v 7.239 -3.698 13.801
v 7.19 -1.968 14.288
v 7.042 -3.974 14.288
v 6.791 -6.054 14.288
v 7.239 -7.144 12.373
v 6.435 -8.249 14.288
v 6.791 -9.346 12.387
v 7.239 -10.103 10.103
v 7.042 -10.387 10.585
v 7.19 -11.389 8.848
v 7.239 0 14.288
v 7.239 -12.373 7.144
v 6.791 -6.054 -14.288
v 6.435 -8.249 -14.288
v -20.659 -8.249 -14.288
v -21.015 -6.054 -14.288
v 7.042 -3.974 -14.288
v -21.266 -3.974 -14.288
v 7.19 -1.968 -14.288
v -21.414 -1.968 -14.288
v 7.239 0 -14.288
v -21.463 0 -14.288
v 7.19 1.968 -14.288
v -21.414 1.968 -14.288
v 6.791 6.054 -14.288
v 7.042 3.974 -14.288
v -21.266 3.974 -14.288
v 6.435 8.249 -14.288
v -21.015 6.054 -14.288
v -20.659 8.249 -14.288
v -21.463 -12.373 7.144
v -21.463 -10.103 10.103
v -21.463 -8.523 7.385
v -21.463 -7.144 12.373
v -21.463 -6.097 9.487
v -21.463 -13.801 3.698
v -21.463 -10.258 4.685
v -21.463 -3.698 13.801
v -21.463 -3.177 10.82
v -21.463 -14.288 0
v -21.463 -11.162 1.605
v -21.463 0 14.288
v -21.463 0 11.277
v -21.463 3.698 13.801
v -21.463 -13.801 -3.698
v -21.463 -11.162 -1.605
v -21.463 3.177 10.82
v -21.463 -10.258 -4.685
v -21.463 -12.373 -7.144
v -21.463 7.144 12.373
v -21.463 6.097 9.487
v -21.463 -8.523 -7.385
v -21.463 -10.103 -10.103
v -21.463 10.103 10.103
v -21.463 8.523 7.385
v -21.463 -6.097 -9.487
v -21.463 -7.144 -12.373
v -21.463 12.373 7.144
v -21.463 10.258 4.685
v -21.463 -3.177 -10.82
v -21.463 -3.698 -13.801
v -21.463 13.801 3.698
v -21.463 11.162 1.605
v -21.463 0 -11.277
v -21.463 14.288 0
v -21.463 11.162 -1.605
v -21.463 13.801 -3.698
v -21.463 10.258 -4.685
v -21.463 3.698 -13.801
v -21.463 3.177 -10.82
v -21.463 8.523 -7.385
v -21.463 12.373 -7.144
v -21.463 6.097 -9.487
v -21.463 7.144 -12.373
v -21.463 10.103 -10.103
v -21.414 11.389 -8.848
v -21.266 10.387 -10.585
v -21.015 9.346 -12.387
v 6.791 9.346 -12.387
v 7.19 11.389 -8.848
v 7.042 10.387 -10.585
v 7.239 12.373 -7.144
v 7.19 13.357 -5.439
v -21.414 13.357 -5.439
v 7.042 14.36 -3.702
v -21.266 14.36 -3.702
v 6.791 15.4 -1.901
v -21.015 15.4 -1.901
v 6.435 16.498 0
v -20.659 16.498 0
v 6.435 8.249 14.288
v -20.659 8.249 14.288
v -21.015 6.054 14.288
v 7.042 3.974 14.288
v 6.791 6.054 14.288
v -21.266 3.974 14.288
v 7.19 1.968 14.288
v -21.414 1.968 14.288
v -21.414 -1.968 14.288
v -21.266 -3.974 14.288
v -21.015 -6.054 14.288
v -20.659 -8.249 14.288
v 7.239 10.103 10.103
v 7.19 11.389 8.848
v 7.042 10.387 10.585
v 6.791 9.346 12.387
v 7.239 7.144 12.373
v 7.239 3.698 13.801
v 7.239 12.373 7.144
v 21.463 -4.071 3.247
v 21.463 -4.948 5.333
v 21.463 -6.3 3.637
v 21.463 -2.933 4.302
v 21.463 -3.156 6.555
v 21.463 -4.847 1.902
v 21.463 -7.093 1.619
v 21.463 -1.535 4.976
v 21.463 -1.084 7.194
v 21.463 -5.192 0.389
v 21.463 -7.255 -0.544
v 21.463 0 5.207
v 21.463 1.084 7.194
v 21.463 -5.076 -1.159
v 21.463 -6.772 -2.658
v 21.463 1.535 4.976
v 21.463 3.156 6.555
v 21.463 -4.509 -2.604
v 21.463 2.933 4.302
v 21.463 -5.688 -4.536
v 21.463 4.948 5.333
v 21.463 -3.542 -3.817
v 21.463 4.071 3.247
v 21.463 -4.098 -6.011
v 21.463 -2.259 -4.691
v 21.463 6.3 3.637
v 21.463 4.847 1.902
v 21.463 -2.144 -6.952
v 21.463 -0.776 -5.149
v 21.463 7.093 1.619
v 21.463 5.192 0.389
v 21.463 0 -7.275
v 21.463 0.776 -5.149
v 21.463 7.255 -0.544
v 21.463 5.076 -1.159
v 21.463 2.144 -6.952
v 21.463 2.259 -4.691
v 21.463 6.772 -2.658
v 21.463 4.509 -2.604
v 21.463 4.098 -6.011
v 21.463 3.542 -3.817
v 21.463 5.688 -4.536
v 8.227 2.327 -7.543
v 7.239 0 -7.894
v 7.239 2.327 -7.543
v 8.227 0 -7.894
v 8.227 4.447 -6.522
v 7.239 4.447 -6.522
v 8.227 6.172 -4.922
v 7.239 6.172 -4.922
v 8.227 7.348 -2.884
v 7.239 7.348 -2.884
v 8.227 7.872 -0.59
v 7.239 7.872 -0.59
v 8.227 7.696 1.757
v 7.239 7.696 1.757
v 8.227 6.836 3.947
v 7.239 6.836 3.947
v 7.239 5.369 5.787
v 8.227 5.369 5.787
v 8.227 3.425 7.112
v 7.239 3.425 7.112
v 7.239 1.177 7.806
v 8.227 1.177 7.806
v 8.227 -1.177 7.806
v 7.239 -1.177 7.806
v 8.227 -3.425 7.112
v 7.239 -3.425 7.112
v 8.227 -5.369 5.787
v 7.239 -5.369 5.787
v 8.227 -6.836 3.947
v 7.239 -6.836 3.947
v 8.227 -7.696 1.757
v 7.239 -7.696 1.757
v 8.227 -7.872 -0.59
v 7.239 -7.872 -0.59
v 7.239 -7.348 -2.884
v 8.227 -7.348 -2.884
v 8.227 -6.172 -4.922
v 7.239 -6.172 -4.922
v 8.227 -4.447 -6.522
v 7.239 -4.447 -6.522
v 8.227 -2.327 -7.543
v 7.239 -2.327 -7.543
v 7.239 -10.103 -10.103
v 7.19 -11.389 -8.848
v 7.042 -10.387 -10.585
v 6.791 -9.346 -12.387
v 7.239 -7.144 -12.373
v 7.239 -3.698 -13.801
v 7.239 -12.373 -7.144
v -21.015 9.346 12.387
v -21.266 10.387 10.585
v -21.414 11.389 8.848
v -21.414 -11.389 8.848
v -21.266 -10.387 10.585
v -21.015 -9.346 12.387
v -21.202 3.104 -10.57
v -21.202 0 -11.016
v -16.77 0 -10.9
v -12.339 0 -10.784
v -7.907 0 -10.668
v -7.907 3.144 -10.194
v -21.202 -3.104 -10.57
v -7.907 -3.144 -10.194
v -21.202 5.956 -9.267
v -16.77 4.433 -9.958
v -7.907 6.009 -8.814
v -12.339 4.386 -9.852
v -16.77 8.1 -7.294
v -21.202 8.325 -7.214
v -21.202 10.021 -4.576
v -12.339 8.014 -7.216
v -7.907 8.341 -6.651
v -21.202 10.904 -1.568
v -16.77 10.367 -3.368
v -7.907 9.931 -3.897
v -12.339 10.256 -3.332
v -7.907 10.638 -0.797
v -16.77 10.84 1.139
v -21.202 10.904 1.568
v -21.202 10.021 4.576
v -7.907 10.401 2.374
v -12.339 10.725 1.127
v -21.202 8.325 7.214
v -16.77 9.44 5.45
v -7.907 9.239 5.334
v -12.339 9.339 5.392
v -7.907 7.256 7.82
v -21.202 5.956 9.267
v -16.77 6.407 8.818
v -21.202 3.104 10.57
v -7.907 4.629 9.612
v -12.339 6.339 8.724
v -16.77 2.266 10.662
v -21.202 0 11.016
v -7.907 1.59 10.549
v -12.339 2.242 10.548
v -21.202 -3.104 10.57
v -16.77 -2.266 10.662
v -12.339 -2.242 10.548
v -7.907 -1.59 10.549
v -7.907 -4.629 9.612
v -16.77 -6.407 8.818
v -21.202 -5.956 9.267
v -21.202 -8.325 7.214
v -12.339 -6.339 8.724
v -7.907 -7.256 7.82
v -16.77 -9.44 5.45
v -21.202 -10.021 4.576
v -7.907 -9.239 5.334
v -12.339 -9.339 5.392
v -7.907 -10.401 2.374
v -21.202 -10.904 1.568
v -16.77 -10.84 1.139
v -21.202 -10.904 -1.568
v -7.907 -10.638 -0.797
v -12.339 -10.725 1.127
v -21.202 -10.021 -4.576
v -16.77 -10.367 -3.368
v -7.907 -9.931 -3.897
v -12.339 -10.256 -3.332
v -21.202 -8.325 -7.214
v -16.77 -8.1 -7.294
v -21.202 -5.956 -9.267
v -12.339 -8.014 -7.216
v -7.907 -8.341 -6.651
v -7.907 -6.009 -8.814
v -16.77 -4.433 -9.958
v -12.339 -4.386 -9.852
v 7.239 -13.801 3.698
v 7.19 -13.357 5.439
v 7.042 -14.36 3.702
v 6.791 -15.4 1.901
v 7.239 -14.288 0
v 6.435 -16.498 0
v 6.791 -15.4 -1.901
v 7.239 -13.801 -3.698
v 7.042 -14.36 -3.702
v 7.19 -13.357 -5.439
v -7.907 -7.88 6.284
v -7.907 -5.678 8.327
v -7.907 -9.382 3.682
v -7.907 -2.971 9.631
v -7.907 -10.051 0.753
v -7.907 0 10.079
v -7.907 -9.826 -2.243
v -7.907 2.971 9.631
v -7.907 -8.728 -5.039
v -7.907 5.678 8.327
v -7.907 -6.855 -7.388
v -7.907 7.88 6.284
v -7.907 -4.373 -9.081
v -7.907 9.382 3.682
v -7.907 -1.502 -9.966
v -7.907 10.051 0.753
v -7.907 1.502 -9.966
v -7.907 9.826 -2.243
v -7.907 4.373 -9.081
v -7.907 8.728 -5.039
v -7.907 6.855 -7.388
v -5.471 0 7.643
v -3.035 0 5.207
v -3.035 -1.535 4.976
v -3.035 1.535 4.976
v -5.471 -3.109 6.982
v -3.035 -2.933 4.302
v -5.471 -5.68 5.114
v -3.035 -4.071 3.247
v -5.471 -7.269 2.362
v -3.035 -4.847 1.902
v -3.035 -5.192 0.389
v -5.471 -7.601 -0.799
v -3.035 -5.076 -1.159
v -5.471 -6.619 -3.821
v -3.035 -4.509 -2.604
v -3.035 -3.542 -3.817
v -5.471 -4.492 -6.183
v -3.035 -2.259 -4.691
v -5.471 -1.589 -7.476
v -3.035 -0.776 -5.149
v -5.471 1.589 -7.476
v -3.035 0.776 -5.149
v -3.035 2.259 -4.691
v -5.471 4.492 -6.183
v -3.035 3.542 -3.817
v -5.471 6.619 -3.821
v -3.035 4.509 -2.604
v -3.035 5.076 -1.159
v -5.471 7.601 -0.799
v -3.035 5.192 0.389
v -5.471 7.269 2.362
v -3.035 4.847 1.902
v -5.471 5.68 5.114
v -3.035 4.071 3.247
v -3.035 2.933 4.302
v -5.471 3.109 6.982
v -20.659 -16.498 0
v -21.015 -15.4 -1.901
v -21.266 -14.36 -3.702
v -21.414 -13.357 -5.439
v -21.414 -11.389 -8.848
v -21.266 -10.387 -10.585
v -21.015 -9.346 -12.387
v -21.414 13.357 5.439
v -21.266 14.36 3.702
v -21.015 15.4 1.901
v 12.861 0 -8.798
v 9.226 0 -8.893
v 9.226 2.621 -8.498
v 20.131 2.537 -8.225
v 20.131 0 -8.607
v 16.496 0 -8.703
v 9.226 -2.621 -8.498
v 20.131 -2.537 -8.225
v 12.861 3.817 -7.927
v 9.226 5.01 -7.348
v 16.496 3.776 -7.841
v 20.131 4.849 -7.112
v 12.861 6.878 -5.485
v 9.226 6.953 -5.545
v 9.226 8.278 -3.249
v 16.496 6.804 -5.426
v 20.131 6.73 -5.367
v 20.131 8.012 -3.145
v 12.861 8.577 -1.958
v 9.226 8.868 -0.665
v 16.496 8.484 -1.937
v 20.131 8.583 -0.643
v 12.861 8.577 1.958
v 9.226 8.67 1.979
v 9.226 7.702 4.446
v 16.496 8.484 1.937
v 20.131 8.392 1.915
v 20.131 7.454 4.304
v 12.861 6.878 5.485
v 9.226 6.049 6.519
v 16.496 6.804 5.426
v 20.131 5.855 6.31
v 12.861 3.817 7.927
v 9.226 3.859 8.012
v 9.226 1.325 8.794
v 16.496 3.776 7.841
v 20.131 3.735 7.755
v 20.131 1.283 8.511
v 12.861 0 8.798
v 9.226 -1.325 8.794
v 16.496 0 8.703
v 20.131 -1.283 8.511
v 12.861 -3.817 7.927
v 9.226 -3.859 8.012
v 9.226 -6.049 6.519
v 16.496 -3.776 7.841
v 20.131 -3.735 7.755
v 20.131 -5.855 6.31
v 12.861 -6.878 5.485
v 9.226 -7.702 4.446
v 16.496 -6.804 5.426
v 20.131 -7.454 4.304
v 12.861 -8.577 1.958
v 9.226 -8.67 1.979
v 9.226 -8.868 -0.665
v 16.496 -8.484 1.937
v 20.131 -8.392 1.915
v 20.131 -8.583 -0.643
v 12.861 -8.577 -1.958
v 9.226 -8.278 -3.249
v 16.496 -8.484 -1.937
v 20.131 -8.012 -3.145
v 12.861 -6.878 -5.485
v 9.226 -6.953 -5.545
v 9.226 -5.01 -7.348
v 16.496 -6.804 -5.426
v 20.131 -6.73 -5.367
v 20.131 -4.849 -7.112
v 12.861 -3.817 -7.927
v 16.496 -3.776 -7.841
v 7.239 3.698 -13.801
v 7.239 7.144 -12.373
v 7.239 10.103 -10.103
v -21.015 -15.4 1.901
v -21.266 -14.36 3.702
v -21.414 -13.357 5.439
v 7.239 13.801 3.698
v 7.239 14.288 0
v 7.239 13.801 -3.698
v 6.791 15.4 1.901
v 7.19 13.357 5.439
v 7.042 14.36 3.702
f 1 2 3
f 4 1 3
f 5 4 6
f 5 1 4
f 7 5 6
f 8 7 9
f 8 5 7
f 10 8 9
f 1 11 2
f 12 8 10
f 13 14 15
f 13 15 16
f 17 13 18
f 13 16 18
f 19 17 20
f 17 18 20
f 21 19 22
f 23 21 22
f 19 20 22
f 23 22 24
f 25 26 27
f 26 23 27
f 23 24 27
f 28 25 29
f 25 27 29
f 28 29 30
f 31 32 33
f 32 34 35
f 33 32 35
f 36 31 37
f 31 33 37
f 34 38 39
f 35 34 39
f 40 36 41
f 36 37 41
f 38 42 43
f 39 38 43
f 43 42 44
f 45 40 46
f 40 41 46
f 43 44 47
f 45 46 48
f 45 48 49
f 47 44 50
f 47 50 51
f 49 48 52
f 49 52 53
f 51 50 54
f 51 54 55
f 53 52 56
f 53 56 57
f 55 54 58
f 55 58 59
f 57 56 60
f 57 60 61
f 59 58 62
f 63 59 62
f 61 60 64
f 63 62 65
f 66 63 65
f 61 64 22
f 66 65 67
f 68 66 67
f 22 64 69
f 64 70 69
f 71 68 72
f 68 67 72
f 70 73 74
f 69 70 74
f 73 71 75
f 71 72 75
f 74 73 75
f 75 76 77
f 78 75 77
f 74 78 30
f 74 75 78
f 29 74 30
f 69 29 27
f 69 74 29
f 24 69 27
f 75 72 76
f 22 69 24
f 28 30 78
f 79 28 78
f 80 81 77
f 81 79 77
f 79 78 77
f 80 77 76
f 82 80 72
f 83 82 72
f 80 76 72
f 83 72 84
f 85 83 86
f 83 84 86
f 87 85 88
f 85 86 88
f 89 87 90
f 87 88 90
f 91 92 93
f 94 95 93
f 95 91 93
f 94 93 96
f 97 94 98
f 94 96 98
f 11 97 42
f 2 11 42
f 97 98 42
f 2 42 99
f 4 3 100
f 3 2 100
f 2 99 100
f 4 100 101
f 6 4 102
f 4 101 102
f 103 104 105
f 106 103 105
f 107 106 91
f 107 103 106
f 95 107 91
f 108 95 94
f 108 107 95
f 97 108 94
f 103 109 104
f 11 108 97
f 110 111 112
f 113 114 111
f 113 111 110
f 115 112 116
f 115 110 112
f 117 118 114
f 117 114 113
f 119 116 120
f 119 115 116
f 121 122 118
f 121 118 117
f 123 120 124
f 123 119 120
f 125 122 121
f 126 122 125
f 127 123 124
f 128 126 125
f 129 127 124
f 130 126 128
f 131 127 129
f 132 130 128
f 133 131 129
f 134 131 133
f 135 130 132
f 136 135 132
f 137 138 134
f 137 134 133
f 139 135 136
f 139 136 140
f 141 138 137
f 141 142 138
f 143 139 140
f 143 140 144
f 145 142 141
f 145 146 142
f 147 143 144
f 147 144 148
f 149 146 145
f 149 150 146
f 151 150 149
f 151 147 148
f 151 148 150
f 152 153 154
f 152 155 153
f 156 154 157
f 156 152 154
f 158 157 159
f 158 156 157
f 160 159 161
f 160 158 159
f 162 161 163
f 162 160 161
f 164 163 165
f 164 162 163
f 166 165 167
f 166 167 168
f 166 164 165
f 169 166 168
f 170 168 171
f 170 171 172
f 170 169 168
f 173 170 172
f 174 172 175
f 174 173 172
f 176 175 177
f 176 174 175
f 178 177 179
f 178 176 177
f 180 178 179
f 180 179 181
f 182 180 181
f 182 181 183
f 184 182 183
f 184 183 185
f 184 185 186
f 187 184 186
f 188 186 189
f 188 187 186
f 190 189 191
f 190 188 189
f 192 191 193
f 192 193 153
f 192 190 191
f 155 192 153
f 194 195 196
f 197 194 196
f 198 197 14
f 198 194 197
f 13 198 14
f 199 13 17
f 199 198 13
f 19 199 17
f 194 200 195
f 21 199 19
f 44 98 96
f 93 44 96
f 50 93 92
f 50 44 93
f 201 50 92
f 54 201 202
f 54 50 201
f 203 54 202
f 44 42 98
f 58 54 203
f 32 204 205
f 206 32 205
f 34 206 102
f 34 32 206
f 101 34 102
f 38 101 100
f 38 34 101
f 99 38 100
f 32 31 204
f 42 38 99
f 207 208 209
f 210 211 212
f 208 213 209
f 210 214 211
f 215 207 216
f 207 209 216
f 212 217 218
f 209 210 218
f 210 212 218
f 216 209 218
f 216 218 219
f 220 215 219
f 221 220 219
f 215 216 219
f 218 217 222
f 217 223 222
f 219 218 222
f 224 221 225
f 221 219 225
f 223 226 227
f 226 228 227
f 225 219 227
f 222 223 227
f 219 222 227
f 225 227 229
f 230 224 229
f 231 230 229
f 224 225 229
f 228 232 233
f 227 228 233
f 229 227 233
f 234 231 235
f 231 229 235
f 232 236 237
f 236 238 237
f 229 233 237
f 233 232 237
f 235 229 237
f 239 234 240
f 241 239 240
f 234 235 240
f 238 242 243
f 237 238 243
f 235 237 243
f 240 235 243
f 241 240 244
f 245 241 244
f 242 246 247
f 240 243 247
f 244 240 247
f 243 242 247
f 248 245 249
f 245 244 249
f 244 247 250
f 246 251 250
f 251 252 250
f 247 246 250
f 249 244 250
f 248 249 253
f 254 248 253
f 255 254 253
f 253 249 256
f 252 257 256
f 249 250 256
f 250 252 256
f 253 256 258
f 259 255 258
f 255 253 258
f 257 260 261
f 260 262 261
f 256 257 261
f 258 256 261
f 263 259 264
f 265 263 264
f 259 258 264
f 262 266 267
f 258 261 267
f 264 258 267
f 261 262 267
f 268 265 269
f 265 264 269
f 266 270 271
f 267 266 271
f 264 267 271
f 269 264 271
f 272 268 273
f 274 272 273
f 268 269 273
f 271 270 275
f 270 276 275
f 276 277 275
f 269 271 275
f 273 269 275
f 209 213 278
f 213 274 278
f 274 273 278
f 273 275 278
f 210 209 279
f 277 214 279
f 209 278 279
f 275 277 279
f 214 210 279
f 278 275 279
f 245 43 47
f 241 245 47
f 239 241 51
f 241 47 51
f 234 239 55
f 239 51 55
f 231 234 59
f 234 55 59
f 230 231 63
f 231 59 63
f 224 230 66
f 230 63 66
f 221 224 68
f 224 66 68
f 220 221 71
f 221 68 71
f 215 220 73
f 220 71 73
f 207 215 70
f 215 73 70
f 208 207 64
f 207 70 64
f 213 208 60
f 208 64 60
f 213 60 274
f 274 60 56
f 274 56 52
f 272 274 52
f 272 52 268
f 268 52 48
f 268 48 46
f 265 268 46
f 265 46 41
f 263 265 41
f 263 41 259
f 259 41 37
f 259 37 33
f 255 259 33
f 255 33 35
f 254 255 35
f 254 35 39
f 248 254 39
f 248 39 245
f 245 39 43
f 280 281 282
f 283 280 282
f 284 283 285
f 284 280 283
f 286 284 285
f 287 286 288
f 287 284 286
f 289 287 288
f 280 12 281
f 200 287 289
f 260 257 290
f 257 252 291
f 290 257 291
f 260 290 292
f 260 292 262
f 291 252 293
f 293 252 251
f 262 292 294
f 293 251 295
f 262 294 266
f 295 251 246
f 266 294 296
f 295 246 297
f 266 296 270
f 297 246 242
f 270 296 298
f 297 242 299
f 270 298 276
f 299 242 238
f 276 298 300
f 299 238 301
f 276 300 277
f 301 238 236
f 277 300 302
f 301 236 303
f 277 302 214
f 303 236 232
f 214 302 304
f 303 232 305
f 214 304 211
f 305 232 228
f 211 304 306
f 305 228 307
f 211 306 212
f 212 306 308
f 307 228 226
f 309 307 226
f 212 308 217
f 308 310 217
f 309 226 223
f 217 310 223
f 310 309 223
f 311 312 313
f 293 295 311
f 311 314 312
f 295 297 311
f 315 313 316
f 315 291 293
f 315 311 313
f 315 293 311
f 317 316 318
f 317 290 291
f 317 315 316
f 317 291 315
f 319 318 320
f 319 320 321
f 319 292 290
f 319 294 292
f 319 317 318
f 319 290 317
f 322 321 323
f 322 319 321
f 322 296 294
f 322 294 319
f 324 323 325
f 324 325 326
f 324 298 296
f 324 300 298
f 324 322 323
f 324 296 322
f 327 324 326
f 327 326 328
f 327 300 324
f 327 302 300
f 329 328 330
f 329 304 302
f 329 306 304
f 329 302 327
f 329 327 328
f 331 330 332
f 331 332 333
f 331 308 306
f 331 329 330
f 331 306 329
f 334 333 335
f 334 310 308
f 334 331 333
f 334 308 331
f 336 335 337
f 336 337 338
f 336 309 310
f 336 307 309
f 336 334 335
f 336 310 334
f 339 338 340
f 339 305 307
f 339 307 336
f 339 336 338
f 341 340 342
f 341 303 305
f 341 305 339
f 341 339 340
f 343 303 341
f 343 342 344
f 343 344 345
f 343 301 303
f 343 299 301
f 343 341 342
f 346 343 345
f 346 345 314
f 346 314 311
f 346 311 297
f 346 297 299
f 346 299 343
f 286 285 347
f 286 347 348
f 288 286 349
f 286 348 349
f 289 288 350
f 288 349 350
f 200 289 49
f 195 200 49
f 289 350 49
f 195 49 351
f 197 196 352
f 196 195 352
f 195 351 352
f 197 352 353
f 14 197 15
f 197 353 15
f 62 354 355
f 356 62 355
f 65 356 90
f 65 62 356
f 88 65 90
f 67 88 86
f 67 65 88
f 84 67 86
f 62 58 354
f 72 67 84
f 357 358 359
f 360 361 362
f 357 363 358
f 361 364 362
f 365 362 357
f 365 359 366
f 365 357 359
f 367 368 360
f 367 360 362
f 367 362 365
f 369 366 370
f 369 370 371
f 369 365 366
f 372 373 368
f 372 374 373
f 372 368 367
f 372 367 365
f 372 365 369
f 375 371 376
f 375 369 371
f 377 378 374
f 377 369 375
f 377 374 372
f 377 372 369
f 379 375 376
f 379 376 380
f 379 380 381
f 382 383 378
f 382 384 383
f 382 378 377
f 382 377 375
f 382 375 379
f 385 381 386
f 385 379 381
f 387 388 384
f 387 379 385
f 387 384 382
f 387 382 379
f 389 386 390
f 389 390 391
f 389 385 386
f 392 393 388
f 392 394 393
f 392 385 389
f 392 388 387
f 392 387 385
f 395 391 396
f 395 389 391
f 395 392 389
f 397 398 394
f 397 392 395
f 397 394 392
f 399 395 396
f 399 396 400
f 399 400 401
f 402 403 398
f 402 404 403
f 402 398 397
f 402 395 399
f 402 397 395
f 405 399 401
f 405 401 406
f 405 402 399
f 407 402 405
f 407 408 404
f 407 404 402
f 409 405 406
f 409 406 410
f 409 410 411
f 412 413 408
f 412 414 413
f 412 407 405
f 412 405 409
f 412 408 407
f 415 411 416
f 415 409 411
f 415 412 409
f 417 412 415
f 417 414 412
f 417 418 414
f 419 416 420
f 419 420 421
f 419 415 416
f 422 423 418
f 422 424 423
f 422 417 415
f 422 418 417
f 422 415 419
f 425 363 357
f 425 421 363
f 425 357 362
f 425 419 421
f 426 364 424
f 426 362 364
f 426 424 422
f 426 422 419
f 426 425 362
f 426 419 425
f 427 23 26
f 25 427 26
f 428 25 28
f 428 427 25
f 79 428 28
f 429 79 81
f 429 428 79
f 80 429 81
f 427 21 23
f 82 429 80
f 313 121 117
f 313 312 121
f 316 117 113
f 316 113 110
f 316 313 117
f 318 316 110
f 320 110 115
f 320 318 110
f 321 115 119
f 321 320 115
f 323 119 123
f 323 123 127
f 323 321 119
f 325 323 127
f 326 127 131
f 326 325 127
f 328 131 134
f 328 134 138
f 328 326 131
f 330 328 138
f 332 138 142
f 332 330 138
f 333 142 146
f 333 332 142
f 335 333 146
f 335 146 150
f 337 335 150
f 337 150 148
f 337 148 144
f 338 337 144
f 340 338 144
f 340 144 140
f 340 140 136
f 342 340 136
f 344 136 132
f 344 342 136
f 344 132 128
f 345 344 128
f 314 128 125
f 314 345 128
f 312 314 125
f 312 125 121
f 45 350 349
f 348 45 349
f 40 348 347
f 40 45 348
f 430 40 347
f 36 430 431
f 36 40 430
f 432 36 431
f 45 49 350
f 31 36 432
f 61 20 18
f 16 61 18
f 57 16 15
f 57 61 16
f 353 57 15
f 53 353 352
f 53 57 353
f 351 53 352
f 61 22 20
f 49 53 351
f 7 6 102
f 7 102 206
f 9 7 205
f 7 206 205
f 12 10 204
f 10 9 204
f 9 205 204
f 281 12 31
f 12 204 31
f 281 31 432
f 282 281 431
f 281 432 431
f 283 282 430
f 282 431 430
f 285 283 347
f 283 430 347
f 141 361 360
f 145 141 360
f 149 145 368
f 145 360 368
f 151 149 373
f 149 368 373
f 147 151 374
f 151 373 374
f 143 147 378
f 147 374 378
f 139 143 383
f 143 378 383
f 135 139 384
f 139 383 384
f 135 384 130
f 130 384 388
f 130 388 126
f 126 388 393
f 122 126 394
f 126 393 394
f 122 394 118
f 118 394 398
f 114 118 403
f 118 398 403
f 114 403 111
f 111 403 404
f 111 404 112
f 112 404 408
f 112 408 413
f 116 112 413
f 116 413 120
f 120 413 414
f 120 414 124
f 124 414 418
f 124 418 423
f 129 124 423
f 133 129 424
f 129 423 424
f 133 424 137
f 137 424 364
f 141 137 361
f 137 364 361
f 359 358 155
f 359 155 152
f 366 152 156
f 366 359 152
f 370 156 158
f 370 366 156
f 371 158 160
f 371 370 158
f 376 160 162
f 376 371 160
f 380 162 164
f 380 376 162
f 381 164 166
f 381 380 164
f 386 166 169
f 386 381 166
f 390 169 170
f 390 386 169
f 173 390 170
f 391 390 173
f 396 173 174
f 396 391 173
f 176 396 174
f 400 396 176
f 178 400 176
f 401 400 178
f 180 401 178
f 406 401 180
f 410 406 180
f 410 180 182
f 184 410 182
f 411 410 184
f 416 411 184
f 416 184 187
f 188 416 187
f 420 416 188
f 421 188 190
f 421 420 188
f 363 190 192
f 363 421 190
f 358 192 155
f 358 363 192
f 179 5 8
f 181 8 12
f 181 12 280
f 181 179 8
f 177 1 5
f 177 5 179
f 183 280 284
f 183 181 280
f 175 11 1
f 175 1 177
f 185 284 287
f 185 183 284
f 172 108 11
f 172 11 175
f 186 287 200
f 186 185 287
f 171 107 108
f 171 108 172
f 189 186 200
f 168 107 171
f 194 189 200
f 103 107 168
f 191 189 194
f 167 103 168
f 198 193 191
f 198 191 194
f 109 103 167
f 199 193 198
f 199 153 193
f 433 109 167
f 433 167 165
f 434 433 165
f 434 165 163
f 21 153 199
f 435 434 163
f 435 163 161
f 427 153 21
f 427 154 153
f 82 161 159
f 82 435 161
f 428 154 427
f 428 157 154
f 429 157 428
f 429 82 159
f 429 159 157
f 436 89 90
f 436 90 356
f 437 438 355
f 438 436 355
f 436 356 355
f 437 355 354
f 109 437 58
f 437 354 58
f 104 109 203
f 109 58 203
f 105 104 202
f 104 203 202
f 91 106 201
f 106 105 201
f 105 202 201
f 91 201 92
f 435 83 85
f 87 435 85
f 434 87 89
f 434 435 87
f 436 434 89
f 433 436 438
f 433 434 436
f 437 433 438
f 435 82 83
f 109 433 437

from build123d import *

# Parameters (mm, degrees)
EXTRUDE1_DEPTH     = 28.702
SKETCH3_OUTSIDE_W  = 244.651
SKETCH3_OUTSIDE_H  = 249.072
SKETCH3_OUTSIDE_R  = 14.2875
CUT_EXTRUDE1_DEPTH = 37.057098264
CUT_EXTRUDE1_DRAFT = -70
SKETCH4_OUTSIDE_W  = 244.652
SKETCH4_OUTSIDE_H  = 249.072
SKETCH4_OUTSIDE_R  = 14.2875
CUT_EXTRUDE2_DEPTH = 37.057098264
CUT_EXTRUDE2_DRAFT = -70
SKETCH5_R          = 8.5725
EXTRUDE2_DEPTH     = 14.224
EXTRUDE2_DRAFT     = 1.5
SKETCH7_R          = 10.668
CUT_EXTRUDE4_DEPTH = 37.591086429
CUT_EXTRUDE4_DRAFT = 1.5
SKETCH12_W         = 6.35
SKETCH12_H         = 16.497783942
SKETCH15_R         = 11.276975829
CUT_EXTRUDE7_DEPTH = 5.08
CUT_EXTRUDE7_DRAFT = -45


with BuildPart() as part:
    # Sketch2 → Extrude1 (new body)
    with BuildSketch(Plane(origin=(-21.463, 0, 0), x_dir=(0, 0, -1), z_dir=(1, 0, 0))):
        Polygon((0, 16.497783942), (-14.2875, 8.248891971), (-14.2875, -8.248891971), (0, -16.497783942), (14.2875, -8.248891971), (14.2875, 8.248891971), align=None)
    extrude(amount=EXTRUDE1_DEPTH)


with BuildPart() as cut_extrude1_tool:
    # Sketch3 outside → Cut-Extrude1 (with draft: the straight prism first)
    with BuildSketch(Plane(origin=(7.239, 0, 0), x_dir=(0, 0, -1), z_dir=(1, 0, 0))):
        with Locations((-0.0005, 0)):
            Rectangle(SKETCH3_OUTSIDE_W, SKETCH3_OUTSIDE_H)
        Circle(SKETCH3_OUTSIDE_R, mode=Mode.SUBTRACT)
    extrude(amount=-CUT_EXTRUDE1_DEPTH)
    # Cut-Extrude1: the draft: its side faces are tilted about the plane it starts from
    cut_extrude1_sides = [cut_extrude1_tool.faces().sort_by_distance(p)[0] for p in [
        (-11.289549132, -124.536, 0.0005),
        (-11.289549132, 0, -122.325),
        (-11.289549132, 124.536, 0.0005),
        (-11.289549132, 0, 122.326),
        (-11.289549132, 0, 14.2875),
    ]]
    draft(cut_extrude1_sides, Plane(origin=(7.239, 0, 0), x_dir=(0, 0, -1), z_dir=(1, 0, 0)), CUT_EXTRUDE1_DRAFT)


with BuildPart() as part_1:
    add(part.part)

    # Cut-Extrude1: cut by cut_extrude1_tool
    add(cut_extrude1_tool.part, mode=Mode.SUBTRACT)


with BuildPart() as cut_extrude2_tool:
    # Sketch4 outside → Cut-Extrude2 (with draft: the straight prism first)
    with BuildSketch(Plane.ZY.offset(21.463)):
        Rectangle(SKETCH4_OUTSIDE_W, SKETCH4_OUTSIDE_H)
        Circle(SKETCH4_OUTSIDE_R, mode=Mode.SUBTRACT)
    extrude(amount=-CUT_EXTRUDE2_DEPTH)
    # Cut-Extrude2: the draft: its side faces are tilted about the plane it starts from
    cut_extrude2_sides = [cut_extrude2_tool.faces().sort_by_distance(p)[0] for p in [
        (-2.934450868, -124.536, 0),
        (-2.934450868, 0, 122.326),
        (-2.934450868, 124.536, 0),
        (-2.934450868, 0, -122.326),
        (-2.934450868, 0, -14.2875),
    ]]
    draft(cut_extrude2_sides, Plane.ZY.offset(21.463), CUT_EXTRUDE2_DRAFT)


with BuildPart() as part_2:
    add(part_1.part)

    # Cut-Extrude2: cut by cut_extrude2_tool
    add(cut_extrude2_tool.part, mode=Mode.SUBTRACT)


with BuildPart() as body_2:
    # Sketch5 → Extrude2 (with draft: the straight prism first)
    with BuildSketch(Plane(origin=(21.463, 0, 0), x_dir=(0, 0, -1), z_dir=(1, 0, 0))):
        Circle(SKETCH5_R)
    extrude(amount=-EXTRUDE2_DEPTH)
    # Extrude2: the draft: its side faces are tilted about the plane it starts from
    extrude2_sides = [body_2.faces().sort_by_distance(p)[0] for p in [
        (14.351, 0, 8.5725),
    ]]
    draft(extrude2_sides, Plane(origin=(21.463, 0, 0), x_dir=(0, 0, -1), z_dir=(1, 0, 0)), EXTRUDE2_DRAFT)

    # Sketch17 → Cut-Revolve2 (revolve, cut)
    with BuildSketch(Plane.XY, mode=Mode.PRIVATE) as cut_revolve2_sk:
        Polygon((21.463, 8.814890815), (21.463, 7.274956448), (19.923065632, 8.814890815), align=None)
        Polygon((7.239, 7.893804996), (8.226777778, 7.893804996), (9.528863597, 9.195890815), (7.239, 9.195890815), align=None)
    revolve(cut_revolve2_sk.sketch.rotate(Axis((-21.463, 0, 0), (1, 0, 0)), 270), axis=Axis((-21.463, 0, 0), (1, 0, 0)), mode=Mode.SUBTRACT)


with BuildPart() as cut_extrude4_tool:
    # Sketch7 → Cut-Extrude4 (with draft: the straight prism first)
    with BuildSketch(Plane(origin=(-7.90702, 0, 0), x_dir=(0, 0, -1), z_dir=(1, 0, 0))):
        Circle(SKETCH7_R)
    extrude(amount=-CUT_EXTRUDE4_DEPTH)
    # Cut-Extrude4: the draft: its side faces are tilted about the plane it starts from
    cut_extrude4_sides = [cut_extrude4_tool.faces().sort_by_distance(p)[0] for p in [
        (-26.702563214, 0, 10.668),
    ]]
    draft(cut_extrude4_sides, Plane(origin=(-7.90702, 0, 0), x_dir=(0, 0, -1), z_dir=(1, 0, 0)), CUT_EXTRUDE4_DRAFT)


with BuildPart() as part_3:
    add(part_2.part)

    # Cut-Extrude4: cut by cut_extrude4_tool
    add(cut_extrude4_tool.part, mode=Mode.SUBTRACT)


with BuildPart() as body_2_1:
    add(body_2.part)

    # Combine1: union part
    add(part_3.part)

    # Sketch12 → Cut-Revolve1 (revolve, cut)
    with BuildSketch(Plane.XY, mode=Mode.PRIVATE) as cut_revolve1_sk:
        Polygon((-7.90702, 10.078793431), (-7.90702, 0), (21.463, 0), (21.463, 5.207), (-3.035226569, 5.207), align=None)
        with Locations((-24.638, 8.248891971)):
            Rectangle(SKETCH12_W, SKETCH12_H)
    revolve(cut_revolve1_sk.sketch.rotate(Axis((-21.463, 0, 0), (1, 0, 0)), 90), axis=Axis((-21.463, 0, 0), (1, 0, 0)), mode=Mode.SUBTRACT)


with BuildPart() as cut_extrude7_tool:
    # Sketch15 → Cut-Extrude7 (with draft: the straight prism first)
    with BuildSketch(Plane.ZY.offset(21.463)):
        Circle(SKETCH15_R)
    extrude(amount=-CUT_EXTRUDE7_DEPTH)
    # Cut-Extrude7: the draft: its side faces are tilted about the plane it starts from
    cut_extrude7_sides = [cut_extrude7_tool.faces().sort_by_distance(p)[0] for p in [
        (-18.923, 0, -11.276975829),
    ]]
    draft(cut_extrude7_sides, Plane.ZY.offset(21.463), CUT_EXTRUDE7_DRAFT)


with BuildPart() as body_2_2:
    add(body_2_1.part)

    # Cut-Extrude7: cut by cut_extrude7_tool
    add(cut_extrude7_tool.part, mode=Mode.SUBTRACT)


solid = body_2_2.part
